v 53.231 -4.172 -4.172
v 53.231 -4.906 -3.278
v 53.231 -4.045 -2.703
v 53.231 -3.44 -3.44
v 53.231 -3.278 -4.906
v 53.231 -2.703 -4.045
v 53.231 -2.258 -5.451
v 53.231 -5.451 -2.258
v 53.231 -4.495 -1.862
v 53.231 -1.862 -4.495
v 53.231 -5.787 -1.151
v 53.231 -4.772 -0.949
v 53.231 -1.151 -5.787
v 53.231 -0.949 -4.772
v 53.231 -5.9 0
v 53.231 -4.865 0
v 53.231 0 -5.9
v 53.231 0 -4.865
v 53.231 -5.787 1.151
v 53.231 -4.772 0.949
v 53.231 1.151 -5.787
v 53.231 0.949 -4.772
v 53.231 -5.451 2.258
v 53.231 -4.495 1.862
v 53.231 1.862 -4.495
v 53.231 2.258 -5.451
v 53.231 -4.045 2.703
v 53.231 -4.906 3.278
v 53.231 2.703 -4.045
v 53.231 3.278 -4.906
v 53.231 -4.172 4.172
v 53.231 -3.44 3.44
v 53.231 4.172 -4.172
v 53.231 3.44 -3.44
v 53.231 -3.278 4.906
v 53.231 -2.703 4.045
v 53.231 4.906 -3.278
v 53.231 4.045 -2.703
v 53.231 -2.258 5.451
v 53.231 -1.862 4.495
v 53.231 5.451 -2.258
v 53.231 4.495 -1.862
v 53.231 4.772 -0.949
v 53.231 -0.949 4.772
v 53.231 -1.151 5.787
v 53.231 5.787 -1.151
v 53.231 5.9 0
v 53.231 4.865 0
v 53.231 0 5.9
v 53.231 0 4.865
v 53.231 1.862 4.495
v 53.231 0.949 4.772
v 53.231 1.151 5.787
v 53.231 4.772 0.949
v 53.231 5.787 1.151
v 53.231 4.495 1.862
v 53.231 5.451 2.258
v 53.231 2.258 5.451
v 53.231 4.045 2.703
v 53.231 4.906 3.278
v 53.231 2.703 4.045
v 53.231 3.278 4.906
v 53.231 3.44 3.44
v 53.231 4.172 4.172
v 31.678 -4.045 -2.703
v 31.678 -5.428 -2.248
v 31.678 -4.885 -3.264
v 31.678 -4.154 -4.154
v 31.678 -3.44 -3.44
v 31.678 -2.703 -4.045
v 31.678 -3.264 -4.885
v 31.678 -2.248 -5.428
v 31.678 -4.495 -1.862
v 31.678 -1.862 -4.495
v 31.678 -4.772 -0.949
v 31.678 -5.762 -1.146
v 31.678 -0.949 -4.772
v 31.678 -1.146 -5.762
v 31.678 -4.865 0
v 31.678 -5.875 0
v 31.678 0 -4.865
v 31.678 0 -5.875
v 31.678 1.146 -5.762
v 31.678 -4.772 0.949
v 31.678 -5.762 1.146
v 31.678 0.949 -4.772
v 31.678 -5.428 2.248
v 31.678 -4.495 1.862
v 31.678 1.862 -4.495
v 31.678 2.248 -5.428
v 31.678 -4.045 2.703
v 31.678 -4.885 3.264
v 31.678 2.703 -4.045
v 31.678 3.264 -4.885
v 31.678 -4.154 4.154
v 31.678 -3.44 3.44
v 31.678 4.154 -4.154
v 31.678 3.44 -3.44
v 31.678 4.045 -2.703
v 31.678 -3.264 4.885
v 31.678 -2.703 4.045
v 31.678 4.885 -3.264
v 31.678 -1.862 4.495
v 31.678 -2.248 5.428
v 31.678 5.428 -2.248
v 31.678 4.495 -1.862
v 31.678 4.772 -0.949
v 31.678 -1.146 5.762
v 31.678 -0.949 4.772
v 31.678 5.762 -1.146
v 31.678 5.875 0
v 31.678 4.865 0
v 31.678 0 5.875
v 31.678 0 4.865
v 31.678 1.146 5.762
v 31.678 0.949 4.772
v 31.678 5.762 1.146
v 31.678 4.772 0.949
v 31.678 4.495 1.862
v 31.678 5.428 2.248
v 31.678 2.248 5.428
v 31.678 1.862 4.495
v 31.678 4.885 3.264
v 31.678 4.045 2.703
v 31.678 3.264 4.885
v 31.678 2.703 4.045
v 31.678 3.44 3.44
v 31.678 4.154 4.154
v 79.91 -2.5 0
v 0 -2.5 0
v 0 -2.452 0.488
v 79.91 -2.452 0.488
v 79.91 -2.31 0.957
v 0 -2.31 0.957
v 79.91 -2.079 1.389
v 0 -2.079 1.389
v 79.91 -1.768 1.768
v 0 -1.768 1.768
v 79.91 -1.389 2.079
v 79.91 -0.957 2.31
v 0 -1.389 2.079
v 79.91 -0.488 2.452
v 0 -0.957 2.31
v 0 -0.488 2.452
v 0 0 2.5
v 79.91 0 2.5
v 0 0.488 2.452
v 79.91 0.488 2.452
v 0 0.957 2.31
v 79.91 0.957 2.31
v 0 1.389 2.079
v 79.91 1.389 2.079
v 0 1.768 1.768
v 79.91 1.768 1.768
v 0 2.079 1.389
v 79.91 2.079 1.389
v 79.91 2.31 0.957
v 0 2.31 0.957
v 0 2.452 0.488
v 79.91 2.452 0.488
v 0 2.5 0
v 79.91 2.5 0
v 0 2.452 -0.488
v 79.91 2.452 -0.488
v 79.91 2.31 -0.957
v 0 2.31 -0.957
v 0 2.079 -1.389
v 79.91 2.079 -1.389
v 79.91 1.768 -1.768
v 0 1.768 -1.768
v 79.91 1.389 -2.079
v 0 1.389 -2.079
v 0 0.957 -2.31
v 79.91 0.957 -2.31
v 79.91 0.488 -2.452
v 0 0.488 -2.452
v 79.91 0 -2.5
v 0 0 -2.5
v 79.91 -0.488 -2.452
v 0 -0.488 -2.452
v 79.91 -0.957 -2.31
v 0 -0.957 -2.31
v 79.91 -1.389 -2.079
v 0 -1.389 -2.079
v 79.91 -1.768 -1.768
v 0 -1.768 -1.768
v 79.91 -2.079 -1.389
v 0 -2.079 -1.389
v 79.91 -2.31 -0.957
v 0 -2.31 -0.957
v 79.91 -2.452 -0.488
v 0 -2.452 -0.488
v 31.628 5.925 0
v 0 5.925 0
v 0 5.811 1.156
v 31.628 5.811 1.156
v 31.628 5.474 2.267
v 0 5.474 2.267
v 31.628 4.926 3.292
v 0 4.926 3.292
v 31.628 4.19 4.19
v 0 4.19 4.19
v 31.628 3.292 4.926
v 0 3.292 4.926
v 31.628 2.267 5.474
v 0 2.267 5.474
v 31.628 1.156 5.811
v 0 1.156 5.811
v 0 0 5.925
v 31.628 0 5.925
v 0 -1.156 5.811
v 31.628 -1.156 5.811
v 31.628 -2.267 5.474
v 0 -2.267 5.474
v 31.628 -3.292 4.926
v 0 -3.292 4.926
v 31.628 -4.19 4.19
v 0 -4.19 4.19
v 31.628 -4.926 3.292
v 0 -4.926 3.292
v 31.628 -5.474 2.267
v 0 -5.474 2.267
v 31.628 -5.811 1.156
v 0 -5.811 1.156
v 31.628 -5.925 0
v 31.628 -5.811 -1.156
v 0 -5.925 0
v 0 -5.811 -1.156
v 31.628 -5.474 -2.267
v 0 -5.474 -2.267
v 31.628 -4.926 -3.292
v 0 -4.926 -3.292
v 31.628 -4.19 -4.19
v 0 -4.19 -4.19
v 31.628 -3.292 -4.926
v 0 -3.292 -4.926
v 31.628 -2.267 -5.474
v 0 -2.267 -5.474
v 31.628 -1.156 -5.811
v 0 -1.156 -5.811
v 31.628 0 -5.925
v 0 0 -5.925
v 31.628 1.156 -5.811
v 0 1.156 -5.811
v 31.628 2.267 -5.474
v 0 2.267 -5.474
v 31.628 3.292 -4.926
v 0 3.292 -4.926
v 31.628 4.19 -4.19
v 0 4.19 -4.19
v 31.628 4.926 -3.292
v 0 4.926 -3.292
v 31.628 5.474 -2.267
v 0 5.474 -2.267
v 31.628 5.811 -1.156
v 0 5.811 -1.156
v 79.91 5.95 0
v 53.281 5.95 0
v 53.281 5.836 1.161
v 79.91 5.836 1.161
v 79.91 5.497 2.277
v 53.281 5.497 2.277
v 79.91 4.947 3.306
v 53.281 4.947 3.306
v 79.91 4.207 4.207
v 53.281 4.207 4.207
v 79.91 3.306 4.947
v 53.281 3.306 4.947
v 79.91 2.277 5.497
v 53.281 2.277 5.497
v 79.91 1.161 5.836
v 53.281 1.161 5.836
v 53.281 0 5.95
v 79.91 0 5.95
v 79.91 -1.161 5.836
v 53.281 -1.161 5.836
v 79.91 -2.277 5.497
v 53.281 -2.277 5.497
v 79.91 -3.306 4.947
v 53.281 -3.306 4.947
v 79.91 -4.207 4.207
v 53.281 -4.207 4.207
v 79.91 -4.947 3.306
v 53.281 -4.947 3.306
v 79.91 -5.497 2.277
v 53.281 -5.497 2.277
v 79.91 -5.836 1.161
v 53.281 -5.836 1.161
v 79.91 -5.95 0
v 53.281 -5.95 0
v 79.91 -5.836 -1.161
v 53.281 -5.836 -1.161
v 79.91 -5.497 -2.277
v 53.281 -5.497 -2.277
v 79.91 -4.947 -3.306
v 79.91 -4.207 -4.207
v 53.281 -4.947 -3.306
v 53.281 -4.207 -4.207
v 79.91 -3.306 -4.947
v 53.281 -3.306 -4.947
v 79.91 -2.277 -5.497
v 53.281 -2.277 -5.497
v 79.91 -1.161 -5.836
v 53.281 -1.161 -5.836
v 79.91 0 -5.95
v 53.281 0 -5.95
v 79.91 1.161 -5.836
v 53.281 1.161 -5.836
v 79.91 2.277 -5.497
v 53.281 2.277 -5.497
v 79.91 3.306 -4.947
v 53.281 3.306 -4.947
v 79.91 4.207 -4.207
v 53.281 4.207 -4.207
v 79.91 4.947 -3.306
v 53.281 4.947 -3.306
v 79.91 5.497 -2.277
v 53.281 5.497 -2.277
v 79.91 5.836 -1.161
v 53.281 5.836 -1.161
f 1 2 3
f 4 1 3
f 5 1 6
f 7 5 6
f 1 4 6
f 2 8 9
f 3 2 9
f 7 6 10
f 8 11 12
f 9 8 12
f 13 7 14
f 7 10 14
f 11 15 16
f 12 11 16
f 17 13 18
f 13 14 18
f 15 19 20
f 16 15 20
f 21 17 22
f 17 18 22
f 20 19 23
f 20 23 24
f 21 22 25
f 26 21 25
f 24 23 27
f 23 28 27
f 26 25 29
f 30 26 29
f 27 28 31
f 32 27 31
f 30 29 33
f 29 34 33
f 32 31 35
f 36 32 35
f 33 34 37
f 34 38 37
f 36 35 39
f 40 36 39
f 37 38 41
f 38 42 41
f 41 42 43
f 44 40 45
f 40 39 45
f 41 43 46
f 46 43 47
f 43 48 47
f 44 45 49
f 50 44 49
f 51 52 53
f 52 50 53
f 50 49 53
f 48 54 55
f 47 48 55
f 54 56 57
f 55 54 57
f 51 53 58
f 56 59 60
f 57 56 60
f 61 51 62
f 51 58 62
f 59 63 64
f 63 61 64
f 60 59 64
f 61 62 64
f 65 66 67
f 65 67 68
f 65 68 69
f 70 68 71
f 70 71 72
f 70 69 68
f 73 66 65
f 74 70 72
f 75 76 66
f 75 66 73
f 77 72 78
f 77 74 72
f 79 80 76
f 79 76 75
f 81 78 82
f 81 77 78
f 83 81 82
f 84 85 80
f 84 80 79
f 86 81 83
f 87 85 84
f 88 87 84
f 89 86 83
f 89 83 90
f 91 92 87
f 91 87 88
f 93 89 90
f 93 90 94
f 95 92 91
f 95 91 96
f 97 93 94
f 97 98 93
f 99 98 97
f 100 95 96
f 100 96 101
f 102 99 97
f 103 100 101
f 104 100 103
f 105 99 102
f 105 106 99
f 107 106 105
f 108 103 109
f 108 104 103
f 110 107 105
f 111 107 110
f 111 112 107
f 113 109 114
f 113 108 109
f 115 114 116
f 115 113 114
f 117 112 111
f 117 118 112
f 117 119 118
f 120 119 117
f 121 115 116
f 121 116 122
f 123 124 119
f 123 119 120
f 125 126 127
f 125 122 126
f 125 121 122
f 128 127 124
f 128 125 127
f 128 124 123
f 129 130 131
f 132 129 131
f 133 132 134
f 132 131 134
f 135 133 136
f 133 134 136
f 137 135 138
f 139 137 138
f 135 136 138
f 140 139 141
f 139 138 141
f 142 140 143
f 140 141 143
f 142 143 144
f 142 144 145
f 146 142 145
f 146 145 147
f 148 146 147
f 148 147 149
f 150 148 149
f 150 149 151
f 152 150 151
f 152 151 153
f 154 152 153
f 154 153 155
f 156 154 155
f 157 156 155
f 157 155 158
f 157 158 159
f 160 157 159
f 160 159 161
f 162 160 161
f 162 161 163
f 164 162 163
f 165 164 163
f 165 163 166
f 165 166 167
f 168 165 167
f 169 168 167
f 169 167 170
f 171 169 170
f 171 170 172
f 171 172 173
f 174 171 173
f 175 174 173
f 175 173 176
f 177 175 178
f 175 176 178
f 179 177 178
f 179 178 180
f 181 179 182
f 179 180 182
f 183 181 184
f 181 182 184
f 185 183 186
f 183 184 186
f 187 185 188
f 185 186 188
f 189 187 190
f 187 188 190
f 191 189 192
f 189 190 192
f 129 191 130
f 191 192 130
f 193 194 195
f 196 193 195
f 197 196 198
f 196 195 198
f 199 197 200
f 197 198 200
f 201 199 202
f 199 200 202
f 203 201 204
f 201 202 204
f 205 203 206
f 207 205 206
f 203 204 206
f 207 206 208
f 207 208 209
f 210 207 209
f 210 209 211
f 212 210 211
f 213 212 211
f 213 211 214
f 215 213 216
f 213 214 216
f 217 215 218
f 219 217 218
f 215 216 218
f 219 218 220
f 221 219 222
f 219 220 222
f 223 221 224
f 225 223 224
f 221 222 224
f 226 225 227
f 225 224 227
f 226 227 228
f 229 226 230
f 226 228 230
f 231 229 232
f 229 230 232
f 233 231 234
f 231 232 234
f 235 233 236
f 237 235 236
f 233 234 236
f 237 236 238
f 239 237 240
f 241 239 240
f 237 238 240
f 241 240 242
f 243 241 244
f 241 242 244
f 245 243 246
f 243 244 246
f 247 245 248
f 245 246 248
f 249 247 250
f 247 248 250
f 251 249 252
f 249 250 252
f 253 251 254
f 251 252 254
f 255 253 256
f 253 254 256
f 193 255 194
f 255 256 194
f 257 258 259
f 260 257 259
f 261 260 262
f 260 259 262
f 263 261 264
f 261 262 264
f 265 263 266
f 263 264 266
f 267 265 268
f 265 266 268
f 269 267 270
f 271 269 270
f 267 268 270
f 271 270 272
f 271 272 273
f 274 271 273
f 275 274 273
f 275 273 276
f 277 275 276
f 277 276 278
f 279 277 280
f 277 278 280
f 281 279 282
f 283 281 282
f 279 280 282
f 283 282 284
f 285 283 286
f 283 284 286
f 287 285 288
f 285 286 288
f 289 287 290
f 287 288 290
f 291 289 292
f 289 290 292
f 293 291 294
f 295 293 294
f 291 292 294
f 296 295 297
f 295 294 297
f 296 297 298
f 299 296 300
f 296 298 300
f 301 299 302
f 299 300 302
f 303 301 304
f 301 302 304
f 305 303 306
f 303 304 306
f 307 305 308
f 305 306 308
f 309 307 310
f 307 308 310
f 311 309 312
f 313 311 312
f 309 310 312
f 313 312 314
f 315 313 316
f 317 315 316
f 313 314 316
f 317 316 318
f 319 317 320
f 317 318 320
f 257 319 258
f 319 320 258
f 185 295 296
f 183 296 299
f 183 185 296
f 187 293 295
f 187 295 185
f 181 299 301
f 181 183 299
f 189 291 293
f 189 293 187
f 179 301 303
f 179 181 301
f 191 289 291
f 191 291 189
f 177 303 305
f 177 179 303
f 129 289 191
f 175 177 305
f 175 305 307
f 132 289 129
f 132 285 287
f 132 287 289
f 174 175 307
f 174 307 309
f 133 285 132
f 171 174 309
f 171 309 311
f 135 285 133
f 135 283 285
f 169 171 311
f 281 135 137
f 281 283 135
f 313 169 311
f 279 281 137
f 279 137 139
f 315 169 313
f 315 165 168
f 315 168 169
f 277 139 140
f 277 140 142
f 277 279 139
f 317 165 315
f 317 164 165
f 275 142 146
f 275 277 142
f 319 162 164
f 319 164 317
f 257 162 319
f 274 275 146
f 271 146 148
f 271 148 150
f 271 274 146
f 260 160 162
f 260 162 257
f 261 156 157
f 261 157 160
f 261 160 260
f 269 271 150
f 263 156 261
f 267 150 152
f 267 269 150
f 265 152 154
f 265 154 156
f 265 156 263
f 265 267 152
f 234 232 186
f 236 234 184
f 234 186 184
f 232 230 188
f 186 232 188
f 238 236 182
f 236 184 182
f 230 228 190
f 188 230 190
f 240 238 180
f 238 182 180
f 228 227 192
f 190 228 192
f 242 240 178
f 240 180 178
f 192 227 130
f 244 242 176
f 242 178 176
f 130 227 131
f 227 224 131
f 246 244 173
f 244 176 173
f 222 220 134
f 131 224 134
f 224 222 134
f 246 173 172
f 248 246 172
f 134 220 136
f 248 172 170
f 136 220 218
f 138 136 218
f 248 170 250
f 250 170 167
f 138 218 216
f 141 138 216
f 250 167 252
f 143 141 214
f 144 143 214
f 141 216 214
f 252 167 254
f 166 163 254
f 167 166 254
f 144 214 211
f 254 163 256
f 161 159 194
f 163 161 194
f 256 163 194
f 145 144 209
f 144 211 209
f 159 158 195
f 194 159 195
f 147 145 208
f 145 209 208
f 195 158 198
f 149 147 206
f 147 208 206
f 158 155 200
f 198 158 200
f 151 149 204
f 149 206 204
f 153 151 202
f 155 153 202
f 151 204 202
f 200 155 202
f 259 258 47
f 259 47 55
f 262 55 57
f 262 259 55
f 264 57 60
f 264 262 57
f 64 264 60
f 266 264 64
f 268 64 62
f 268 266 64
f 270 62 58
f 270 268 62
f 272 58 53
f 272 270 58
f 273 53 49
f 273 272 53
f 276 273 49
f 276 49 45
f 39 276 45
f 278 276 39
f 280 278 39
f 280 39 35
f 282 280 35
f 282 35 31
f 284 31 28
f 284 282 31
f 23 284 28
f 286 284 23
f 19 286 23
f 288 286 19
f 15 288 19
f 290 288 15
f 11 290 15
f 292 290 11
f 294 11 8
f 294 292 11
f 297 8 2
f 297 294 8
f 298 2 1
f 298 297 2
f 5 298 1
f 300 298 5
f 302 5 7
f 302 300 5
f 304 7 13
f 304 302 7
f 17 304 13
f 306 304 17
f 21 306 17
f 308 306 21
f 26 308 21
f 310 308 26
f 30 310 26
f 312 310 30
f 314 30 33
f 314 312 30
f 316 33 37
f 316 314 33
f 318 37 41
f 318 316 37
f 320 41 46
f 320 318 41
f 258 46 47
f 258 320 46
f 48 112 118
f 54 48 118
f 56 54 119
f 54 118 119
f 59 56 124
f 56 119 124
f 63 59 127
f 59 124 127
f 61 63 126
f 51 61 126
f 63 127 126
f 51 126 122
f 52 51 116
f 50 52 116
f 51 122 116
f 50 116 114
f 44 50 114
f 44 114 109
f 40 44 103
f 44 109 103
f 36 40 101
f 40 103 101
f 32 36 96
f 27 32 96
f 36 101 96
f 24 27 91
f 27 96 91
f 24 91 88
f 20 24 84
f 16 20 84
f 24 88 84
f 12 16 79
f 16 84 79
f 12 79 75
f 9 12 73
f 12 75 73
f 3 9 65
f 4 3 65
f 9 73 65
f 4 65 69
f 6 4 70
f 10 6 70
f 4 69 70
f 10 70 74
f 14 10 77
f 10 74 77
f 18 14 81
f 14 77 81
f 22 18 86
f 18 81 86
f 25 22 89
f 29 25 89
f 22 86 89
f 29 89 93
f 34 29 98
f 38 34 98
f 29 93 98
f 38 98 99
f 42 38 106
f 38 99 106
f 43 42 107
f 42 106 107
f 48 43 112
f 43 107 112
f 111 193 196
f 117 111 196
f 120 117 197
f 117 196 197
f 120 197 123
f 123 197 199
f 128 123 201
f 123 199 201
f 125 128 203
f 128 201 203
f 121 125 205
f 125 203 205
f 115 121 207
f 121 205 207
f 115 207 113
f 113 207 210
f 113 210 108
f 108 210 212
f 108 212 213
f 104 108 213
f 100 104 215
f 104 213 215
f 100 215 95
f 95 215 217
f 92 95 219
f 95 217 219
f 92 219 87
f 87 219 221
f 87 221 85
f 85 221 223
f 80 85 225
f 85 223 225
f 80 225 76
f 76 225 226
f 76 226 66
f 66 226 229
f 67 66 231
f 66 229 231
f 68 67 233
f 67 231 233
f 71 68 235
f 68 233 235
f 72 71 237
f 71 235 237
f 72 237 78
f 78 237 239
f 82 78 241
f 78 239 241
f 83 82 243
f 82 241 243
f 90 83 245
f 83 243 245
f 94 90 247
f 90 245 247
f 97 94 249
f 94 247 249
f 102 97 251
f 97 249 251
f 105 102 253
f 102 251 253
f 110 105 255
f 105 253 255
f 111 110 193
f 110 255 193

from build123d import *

# Parameters (mm, degrees)
F0_R     = 5.925
F1_DEPTH = 31.678
F2_R     = 4.865
F3_DEPTH = 21.553
F4_R     = 5.95
F4_R_2   = 4.865
F5_DEPTH = 26.679
F7_D     = 5
F8_SIZE  = 0.05
F9_SIZE  = 0.05


with BuildPart() as f1:
    # F0 (on Right) → F1 (new body)
    with BuildSketch(Plane.YZ):
        Circle(F0_R)
    extrude(amount=F1_DEPTH)

    # F2 (on face) → F3 (join)
    with BuildSketch(Plane.YZ.offset(31.678)):
        Circle(F2_R)
    extrude(amount=F3_DEPTH)

    # F4 (on face) → F5 (join)
    with BuildSketch(Plane.YZ.offset(53.231)):
        Circle(F4_R)
        Circle(F4_R_2, mode=Mode.SUBTRACT)
        Circle(F4_R_2)
    extrude(amount=F5_DEPTH)

    # F7 (through all)
    with Locations(Plane.YZ.offset(79.91)):
        with Locations((0, 0)):
            Hole(F7_D / 2)

    # F8
    f8_edges = [f1.edges().sort_by_distance(p)[0] for p in [
        (31.678, -5.925, 0),
    ]]
    chamfer(f8_edges, length=F8_SIZE)

    # F9
    f9_edges = [f1.edges().sort_by_distance(p)[0] for p in [
        (53.231, -5.95, 0),
    ]]
    chamfer(f9_edges, length=F9_SIZE)


solid = f1.part
